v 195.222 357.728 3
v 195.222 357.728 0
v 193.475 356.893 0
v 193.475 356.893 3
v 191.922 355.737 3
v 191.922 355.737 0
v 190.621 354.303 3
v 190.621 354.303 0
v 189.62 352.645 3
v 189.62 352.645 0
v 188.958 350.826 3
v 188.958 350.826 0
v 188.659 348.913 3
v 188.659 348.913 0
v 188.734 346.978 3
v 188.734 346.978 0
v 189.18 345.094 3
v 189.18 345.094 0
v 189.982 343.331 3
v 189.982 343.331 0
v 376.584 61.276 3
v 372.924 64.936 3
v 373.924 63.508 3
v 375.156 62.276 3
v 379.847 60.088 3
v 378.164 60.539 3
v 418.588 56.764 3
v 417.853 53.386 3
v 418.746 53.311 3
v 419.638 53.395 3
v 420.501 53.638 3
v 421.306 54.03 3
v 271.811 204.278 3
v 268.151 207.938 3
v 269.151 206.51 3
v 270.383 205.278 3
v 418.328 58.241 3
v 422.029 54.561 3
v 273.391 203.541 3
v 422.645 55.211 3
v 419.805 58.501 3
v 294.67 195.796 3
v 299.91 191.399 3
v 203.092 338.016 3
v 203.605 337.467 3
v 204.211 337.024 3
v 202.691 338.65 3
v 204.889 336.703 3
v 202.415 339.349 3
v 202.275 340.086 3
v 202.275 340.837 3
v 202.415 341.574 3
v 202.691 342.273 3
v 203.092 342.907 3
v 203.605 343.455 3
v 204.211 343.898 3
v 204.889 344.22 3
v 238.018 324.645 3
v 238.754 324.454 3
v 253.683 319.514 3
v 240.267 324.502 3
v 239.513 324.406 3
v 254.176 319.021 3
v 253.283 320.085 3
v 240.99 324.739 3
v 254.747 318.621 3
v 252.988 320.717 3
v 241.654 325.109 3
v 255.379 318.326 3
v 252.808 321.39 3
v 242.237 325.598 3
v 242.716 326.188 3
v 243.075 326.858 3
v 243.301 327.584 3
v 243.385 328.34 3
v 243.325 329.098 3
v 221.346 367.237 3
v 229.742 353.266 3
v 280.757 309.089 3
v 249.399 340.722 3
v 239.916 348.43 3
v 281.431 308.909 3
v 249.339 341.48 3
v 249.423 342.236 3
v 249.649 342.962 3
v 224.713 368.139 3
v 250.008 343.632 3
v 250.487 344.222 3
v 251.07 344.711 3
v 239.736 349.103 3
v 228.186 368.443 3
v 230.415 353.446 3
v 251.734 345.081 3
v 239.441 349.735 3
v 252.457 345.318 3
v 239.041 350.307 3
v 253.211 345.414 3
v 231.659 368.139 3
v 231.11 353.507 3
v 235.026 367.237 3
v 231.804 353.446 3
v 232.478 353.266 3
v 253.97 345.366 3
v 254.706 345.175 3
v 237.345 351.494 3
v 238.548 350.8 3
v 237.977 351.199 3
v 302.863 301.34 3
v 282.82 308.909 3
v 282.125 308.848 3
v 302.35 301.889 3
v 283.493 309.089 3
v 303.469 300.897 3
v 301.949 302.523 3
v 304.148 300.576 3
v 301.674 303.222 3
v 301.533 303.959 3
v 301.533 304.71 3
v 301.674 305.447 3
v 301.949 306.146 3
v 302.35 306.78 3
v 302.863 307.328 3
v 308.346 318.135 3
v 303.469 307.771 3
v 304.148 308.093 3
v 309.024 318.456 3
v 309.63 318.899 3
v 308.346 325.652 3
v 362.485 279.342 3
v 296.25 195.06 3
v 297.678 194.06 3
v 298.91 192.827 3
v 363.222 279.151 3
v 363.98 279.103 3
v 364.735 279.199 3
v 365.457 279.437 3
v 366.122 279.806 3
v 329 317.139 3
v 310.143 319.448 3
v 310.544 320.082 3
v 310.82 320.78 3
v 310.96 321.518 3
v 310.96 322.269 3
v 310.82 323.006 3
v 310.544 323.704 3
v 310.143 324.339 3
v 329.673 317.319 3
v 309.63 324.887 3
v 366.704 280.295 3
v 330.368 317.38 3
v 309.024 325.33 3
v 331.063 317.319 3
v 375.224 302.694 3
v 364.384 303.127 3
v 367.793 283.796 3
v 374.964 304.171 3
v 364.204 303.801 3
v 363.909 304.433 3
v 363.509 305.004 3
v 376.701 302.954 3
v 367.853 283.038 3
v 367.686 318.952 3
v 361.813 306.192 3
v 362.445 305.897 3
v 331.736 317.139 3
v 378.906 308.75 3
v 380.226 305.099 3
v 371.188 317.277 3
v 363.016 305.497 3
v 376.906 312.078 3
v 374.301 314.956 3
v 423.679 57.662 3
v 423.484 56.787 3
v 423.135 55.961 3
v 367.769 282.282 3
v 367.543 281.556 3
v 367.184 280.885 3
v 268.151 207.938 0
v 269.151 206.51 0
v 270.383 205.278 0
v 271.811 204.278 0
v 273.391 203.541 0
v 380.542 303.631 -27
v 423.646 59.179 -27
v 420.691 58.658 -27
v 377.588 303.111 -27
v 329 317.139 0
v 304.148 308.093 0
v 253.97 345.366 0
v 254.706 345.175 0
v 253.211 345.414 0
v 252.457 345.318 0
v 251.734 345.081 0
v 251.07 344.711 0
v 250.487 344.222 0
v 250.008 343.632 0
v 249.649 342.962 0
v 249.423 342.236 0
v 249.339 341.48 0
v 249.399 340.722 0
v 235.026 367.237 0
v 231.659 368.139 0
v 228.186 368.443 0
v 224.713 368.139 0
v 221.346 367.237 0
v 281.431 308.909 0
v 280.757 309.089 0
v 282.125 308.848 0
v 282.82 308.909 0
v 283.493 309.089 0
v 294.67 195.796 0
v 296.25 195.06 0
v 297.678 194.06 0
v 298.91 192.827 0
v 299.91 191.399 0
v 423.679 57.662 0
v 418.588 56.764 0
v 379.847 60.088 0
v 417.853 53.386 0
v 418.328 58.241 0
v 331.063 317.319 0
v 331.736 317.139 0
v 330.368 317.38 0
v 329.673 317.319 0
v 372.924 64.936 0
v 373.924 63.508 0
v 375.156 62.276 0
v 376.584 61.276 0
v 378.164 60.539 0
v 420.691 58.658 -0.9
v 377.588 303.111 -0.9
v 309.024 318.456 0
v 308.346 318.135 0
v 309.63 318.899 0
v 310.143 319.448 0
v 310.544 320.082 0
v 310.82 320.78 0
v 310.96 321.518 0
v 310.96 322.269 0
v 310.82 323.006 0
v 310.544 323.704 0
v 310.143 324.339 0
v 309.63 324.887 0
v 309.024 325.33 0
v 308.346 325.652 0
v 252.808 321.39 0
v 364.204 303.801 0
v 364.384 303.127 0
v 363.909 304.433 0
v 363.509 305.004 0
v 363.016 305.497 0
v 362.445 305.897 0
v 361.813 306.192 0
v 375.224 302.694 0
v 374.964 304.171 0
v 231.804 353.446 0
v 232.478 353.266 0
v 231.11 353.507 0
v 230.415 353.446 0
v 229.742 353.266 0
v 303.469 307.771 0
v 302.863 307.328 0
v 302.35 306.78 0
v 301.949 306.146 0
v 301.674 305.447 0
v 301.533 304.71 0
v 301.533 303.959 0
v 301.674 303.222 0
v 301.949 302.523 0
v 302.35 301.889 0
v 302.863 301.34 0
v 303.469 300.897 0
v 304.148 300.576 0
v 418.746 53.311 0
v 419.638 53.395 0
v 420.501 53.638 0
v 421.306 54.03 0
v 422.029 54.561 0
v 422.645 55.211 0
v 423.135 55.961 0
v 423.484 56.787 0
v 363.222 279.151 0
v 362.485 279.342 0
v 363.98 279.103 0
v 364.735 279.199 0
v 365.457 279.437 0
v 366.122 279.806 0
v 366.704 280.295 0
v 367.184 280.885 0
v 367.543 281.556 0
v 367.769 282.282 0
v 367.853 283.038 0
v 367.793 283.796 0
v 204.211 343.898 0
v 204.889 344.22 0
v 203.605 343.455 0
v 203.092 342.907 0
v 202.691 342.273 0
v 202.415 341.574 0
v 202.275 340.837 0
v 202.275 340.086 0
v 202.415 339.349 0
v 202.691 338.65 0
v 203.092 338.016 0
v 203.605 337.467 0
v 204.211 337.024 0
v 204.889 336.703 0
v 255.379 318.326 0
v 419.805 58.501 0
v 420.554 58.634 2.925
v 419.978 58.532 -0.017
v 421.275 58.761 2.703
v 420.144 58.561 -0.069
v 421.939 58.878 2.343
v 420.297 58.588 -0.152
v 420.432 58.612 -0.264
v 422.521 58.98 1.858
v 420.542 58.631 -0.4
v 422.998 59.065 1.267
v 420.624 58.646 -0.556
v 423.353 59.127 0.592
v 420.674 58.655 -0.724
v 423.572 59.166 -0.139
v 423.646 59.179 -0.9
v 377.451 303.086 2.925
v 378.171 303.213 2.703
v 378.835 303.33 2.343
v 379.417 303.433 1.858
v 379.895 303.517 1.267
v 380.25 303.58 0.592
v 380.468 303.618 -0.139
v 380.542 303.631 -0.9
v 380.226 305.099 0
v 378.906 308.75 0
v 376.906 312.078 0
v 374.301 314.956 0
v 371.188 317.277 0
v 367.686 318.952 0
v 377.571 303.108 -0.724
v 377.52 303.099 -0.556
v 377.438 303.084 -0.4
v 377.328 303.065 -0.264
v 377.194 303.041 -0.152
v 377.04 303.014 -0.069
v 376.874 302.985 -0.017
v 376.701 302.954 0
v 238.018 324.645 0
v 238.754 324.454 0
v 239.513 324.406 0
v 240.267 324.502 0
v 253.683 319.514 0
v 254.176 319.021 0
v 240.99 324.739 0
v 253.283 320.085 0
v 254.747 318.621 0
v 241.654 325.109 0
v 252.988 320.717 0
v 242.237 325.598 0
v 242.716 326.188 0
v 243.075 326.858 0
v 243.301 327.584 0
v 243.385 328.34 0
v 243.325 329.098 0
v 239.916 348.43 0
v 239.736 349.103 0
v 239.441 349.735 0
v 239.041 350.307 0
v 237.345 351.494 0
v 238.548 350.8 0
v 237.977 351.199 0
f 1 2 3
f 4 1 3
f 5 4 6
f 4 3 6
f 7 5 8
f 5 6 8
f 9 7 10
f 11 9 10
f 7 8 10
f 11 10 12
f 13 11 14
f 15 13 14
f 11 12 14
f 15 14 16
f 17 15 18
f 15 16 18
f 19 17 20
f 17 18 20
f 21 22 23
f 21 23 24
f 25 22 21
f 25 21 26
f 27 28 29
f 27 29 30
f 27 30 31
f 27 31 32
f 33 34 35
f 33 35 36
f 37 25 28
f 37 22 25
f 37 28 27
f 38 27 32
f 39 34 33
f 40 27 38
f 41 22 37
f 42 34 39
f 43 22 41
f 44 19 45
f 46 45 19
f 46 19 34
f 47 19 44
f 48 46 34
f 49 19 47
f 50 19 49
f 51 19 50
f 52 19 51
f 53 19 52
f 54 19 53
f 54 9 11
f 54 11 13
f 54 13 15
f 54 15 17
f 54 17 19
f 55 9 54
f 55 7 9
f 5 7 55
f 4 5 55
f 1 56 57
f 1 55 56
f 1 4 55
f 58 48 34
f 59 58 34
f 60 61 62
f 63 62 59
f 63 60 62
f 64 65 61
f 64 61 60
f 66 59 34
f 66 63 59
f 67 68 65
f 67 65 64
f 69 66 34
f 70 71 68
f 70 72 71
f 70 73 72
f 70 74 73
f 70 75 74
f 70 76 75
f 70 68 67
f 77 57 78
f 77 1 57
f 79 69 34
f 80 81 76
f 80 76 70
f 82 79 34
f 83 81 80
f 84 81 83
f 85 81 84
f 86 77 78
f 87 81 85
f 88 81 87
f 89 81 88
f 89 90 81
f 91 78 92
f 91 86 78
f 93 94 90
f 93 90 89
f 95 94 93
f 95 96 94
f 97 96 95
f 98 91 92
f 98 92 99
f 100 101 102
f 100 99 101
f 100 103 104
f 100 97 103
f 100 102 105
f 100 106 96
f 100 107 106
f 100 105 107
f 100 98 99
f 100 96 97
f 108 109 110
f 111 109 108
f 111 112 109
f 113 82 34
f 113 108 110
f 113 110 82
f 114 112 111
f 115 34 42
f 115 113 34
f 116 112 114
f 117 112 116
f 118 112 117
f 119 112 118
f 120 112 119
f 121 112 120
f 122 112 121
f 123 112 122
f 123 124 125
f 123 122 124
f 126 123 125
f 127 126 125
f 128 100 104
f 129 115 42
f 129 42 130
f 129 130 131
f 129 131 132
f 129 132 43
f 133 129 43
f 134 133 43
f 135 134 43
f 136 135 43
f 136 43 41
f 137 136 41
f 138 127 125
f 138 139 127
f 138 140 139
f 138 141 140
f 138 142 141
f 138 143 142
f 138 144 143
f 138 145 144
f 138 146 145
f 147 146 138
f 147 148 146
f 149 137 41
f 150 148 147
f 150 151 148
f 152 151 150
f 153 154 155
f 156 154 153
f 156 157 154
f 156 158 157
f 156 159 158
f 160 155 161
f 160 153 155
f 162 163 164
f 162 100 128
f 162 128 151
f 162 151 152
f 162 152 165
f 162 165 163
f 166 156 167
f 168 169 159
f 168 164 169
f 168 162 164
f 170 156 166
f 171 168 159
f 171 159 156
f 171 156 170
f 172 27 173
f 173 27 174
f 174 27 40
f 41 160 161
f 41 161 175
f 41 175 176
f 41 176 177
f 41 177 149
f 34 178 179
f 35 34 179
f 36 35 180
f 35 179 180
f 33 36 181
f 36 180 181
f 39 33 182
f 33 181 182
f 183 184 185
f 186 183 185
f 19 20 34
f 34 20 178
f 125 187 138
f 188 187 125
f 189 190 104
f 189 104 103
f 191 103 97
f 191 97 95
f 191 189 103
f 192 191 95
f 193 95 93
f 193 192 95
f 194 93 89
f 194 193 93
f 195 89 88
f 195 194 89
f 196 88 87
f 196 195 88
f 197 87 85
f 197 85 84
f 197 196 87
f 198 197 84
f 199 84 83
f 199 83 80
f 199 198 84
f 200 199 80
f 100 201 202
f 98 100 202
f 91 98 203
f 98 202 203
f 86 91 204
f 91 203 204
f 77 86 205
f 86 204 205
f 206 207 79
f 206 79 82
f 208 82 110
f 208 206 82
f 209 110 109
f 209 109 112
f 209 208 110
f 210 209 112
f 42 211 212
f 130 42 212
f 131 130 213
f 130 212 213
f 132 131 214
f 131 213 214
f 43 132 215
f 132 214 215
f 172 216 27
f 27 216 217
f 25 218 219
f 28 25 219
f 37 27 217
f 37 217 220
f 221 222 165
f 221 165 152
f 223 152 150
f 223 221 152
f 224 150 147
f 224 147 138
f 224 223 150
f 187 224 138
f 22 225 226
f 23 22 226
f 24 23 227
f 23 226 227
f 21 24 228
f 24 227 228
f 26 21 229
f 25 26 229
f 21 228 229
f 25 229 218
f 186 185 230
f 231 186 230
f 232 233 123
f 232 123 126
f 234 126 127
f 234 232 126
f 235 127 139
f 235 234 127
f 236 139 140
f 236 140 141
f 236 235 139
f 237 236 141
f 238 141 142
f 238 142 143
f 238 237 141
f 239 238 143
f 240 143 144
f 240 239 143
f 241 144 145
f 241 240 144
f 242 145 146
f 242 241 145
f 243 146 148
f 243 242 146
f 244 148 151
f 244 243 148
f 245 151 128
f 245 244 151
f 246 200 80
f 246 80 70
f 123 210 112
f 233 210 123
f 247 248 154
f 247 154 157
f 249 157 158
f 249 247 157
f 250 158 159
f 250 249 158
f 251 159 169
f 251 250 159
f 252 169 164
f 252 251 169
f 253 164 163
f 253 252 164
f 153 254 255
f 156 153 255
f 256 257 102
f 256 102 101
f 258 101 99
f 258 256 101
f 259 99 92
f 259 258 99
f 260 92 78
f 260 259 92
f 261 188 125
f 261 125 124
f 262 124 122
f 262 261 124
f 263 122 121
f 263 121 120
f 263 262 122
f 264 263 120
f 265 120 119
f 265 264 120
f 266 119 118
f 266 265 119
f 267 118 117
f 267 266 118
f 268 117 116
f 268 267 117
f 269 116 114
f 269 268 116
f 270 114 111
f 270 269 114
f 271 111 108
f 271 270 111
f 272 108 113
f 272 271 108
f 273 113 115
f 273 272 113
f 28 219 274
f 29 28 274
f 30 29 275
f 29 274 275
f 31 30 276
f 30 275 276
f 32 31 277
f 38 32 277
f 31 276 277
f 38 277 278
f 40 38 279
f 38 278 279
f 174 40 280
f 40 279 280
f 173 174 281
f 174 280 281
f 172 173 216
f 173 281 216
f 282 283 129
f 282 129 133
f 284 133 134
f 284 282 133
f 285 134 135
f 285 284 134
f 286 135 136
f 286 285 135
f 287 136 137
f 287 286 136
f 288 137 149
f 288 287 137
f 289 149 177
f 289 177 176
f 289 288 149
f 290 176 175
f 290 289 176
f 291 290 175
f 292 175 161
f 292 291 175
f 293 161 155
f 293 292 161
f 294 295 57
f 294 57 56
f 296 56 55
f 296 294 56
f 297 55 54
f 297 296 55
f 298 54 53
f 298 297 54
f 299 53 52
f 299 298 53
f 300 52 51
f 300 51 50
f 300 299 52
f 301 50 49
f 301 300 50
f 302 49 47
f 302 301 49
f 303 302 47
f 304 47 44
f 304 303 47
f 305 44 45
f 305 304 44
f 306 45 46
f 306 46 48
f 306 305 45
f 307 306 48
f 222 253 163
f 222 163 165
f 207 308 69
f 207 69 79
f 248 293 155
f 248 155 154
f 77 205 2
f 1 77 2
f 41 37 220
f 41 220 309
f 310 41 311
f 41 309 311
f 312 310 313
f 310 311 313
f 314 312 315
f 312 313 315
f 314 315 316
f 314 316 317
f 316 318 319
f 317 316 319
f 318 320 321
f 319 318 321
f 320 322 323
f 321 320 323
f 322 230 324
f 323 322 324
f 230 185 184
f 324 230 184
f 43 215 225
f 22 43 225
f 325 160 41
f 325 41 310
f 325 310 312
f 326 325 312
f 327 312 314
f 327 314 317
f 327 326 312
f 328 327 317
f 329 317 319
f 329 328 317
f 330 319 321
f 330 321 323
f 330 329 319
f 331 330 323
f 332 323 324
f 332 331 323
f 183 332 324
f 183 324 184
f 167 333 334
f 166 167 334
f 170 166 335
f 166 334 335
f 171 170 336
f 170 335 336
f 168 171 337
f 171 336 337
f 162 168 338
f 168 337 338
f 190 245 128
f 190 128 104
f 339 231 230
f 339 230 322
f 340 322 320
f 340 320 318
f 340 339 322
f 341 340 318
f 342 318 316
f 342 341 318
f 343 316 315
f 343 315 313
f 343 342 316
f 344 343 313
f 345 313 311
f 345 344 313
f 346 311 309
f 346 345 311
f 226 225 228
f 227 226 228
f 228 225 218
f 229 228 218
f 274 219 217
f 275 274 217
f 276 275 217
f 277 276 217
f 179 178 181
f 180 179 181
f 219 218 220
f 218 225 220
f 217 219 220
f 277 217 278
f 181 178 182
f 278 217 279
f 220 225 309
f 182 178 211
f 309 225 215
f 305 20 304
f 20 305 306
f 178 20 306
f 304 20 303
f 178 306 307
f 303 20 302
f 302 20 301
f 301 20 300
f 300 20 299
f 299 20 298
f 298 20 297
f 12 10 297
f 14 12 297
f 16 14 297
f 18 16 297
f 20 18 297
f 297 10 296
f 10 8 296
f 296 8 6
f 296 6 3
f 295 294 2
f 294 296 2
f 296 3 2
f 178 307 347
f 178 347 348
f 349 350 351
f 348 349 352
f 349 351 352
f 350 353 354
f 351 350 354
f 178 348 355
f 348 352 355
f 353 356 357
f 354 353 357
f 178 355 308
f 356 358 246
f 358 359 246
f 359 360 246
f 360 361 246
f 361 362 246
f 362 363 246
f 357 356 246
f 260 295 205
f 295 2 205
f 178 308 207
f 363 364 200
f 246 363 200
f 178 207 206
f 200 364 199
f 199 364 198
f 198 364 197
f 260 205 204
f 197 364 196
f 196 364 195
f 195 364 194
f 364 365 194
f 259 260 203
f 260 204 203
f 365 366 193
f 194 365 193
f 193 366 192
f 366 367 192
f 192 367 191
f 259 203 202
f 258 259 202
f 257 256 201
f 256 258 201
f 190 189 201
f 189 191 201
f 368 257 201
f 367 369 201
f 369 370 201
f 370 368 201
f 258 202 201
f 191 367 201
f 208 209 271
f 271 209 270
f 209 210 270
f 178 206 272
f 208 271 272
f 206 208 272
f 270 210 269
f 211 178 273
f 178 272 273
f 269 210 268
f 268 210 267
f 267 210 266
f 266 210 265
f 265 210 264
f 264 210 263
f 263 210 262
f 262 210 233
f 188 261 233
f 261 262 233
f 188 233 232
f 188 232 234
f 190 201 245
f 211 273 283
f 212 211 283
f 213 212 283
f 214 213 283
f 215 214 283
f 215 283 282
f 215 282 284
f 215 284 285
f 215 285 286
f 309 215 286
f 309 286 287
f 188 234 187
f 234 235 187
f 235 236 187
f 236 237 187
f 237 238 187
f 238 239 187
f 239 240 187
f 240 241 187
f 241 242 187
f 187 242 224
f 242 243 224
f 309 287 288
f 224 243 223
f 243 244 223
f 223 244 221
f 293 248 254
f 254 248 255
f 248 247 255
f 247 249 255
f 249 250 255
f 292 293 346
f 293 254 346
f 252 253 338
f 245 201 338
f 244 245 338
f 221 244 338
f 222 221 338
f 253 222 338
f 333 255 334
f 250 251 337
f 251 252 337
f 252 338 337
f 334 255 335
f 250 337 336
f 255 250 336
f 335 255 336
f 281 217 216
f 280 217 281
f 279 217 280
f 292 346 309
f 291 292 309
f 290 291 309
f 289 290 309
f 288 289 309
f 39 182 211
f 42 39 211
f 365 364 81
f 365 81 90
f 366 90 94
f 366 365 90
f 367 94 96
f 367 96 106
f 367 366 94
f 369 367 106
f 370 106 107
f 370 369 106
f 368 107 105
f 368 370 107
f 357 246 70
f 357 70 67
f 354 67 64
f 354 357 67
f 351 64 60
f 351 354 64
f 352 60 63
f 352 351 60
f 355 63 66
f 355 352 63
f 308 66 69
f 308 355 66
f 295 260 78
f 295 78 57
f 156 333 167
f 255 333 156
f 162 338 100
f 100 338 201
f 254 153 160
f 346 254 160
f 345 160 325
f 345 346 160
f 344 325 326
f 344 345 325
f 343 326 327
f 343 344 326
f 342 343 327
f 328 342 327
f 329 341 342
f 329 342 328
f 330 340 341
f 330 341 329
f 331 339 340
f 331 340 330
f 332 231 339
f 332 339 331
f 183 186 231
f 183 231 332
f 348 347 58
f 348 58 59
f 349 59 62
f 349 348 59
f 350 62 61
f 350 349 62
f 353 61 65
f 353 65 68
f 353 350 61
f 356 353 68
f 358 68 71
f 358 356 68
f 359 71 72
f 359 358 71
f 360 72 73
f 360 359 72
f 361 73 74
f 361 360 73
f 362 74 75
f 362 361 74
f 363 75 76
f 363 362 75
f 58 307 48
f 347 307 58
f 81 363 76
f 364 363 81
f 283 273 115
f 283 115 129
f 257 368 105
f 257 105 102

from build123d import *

# Parameters (mm, degrees)
RESSALTO_EXTRUS_O1_DEPTH        = 3
ARESTA_FLANGE1_STRIP_W          = 13.8
ARESTA_FLANGE1_STRIP_H          = 3
ARESTA_FLANGE1_STRIP_CUT_DEPTH  = 248.223813341
ARESTA_FLANGE1_RELIEF_W         = 15.3
ARESTA_FLANGE1_RELIEF_H         = 1.5
ARESTA_FLANGE1_RELIEF_CUT_DEPTH = 3
ARESTA_FLANGE1_DEPTH            = 248.223813341


# Sheet-metal steps are written as plain solids
with BuildPart() as part:
    # Esboço29 → Ressalto-extrusão1 (new body)
    with BuildSketch(Plane.XY):
        with BuildLine():
            Line((423.645620755, 59.178719541), (380.542007914, 303.631455401))
            ThreePointArc((380.542007914, 303.631455401), (376.166741716, 313.014244041), (367.686255721, 318.952344263))
            Line((367.686255721, 318.952344263), (235.026475013, 367.236555725))
            ThreePointArc((235.026475013, 367.236555725), (228.186072146, 368.44270331), (221.34566928, 367.236555725))
            Line((221.34566928, 367.236555725), (195.221638123, 357.728185985))
            ThreePointArc((195.221638123, 357.728185985), (189.244913348, 351.75146121), (189.981585518, 343.331259777))
            Line((189.981585518, 343.331259777), (268.150737271, 207.938317356))
            ThreePointArc((268.150737271, 207.938317356), (270.383115212, 205.277872925), (273.390789876, 203.541391148))
            Line((273.390789876, 203.541391148), (294.669915314, 195.796422877))
            ThreePointArc((294.669915314, 195.796422877), (297.677589977, 194.059941101), (299.909967918, 191.399496669))
            Line((299.909967918, 191.399496669), (372.923716413, 64.935974625))
            ThreePointArc((372.923716413, 64.935974625), (375.848206088, 61.744454182), (379.847488675, 60.087897095))
            Line((379.847488675, 60.087897095), (417.853341101, 53.386439887))
            ThreePointArc((417.853341101, 53.386439887), (422.257115895, 54.774944746), (423.645620755, 59.178719541))
        make_face()
        with BuildLine():
            Line((243.325022214, 329.098265065), (239.916324262, 348.429951789))
            ThreePointArc((239.916324262, 348.429951789), (239.041271023, 350.306509517), (237.345173823, 351.494129561))
            Line((237.345173823, 351.494129561), (232.47795712, 353.265651565))
            ThreePointArc((232.47795712, 353.265651565), (231.109876546, 353.506881082), (229.741795973, 353.265651565))
            Line((229.741795973, 353.265651565), (204.889458572, 344.220140499))
            ThreePointArc((204.889458572, 344.220140499), (202.257539145, 340.461370016), (204.889458572, 336.702599533))
            Line((204.889458572, 336.702599533), (238.017710629, 324.644901871))
            ThreePointArc((238.017710629, 324.644901871), (241.956941641, 325.339494581), (243.325022214, 329.098265065))
        make_face(mode=Mode.SUBTRACT)
        with BuildLine():
            Line((249.39887944, 340.721872869), (252.807577392, 321.390186145))
            ThreePointArc((252.807577392, 321.390186145), (253.682630632, 319.513628417), (255.378727831, 318.326008373))
            Line((255.378727831, 318.326008373), (280.757120558, 309.089028826))
            ThreePointArc((280.757120558, 309.089028826), (282.125201132, 308.847799309), (283.493281705, 309.089028826))
            Line((283.493281705, 309.089028826), (308.345619106, 318.134539892))
            ThreePointArc((308.345619106, 318.134539892), (310.977538533, 321.893310376), (308.345619106, 325.652080859))
            Line((308.345619106, 325.652080859), (254.706191026, 345.175236063))
            ThreePointArc((254.706191026, 345.175236063), (250.766960014, 344.480643352), (249.39887944, 340.721872869))
        make_face(mode=Mode.SUBTRACT)
        with BuildLine():
            Line((328.999893161, 317.138658679), (304.14755576, 308.093147613))
            ThreePointArc((304.14755576, 308.093147613), (301.515636333, 304.33437713), (304.14755576, 300.575606647))
            Line((304.14755576, 300.575606647), (362.485446944, 279.342350725))
            ThreePointArc((362.485446944, 279.342350725), (366.424677956, 280.036943436), (367.79275853, 283.795713919))
            Line((367.79275853, 283.795713919), (364.384060578, 303.127400644))
            ThreePointArc((364.384060578, 303.127400644), (363.509007338, 305.003958372), (361.812910139, 306.191578416))
            Line((361.812910139, 306.191578416), (331.736054308, 317.138658679))
            ThreePointArc((331.736054308, 317.138658679), (330.367973734, 317.379888196), (328.999893161, 317.138658679))
        make_face(mode=Mode.SUBTRACT)
    extrude(amount=RESSALTO_EXTRUS_O1_DEPTH)

    # Aresta-Flange1 strip (across the edge) → Aresta-Flange1 strip cut (cut)
    with BuildSketch(Plane(origin=(380.542007914, 303.631455401, 0), x_dir=(-0.9848077530122086, -0.17364817766692797, -3.491481338843133e-15), z_dir=(0.17364817766692797, -0.9848077530122086, 0))):
        with Locations((-3, -1.5)):
            Rectangle(ARESTA_FLANGE1_STRIP_W, ARESTA_FLANGE1_STRIP_H)
    extrude(amount=ARESTA_FLANGE1_STRIP_CUT_DEPTH, mode=Mode.SUBTRACT)

    # Aresta-Flange1 relief (on the sheet) → Aresta-Flange1 relief cut (cut)
    with BuildSketch(Plane(origin=(376.701257678, 302.954227508, 0), x_dir=(-0.9848077530122086, -0.17364817766692797, -6.982962677686267e-15), z_dir=(0, 0, -1))):
        with Locations((-6.15, 0.75)):
            Rectangle(ARESTA_FLANGE1_RELIEF_W, ARESTA_FLANGE1_RELIEF_H)
        with Locations((-6.15, -248.973813341)):
            Rectangle(ARESTA_FLANGE1_RELIEF_W, ARESTA_FLANGE1_RELIEF_H)
    extrude(amount=-ARESTA_FLANGE1_RELIEF_CUT_DEPTH, mode=Mode.SUBTRACT)

    # Aresta-Flange1 section (across the edge) → Aresta-Flange1 (add)
    with BuildSketch(Plane(origin=(380.542007914, 303.631455401, 0), x_dir=(-0.9848077530122086, -0.17364817766692797, -3.491481338843133e-15), z_dir=(0.17364817766692797, -0.9848077530122086, 0))):
        with BuildLine():
            Line((0, 0.9), (0, 27))
            Line((0, 27), (3, 27))
            Line((3, 27), (3, 0.9))
            ThreePointArc((3, 0.9), (3.263603897, 0.263603897), (3.9, 0))
            Line((3.9, 0), (3.9, -3))
            ThreePointArc((3.9, -3), (1.142283553, -1.857716447), (0, 0.9))
        make_face()
    extrude(amount=ARESTA_FLANGE1_DEPTH)


solid = part.part
